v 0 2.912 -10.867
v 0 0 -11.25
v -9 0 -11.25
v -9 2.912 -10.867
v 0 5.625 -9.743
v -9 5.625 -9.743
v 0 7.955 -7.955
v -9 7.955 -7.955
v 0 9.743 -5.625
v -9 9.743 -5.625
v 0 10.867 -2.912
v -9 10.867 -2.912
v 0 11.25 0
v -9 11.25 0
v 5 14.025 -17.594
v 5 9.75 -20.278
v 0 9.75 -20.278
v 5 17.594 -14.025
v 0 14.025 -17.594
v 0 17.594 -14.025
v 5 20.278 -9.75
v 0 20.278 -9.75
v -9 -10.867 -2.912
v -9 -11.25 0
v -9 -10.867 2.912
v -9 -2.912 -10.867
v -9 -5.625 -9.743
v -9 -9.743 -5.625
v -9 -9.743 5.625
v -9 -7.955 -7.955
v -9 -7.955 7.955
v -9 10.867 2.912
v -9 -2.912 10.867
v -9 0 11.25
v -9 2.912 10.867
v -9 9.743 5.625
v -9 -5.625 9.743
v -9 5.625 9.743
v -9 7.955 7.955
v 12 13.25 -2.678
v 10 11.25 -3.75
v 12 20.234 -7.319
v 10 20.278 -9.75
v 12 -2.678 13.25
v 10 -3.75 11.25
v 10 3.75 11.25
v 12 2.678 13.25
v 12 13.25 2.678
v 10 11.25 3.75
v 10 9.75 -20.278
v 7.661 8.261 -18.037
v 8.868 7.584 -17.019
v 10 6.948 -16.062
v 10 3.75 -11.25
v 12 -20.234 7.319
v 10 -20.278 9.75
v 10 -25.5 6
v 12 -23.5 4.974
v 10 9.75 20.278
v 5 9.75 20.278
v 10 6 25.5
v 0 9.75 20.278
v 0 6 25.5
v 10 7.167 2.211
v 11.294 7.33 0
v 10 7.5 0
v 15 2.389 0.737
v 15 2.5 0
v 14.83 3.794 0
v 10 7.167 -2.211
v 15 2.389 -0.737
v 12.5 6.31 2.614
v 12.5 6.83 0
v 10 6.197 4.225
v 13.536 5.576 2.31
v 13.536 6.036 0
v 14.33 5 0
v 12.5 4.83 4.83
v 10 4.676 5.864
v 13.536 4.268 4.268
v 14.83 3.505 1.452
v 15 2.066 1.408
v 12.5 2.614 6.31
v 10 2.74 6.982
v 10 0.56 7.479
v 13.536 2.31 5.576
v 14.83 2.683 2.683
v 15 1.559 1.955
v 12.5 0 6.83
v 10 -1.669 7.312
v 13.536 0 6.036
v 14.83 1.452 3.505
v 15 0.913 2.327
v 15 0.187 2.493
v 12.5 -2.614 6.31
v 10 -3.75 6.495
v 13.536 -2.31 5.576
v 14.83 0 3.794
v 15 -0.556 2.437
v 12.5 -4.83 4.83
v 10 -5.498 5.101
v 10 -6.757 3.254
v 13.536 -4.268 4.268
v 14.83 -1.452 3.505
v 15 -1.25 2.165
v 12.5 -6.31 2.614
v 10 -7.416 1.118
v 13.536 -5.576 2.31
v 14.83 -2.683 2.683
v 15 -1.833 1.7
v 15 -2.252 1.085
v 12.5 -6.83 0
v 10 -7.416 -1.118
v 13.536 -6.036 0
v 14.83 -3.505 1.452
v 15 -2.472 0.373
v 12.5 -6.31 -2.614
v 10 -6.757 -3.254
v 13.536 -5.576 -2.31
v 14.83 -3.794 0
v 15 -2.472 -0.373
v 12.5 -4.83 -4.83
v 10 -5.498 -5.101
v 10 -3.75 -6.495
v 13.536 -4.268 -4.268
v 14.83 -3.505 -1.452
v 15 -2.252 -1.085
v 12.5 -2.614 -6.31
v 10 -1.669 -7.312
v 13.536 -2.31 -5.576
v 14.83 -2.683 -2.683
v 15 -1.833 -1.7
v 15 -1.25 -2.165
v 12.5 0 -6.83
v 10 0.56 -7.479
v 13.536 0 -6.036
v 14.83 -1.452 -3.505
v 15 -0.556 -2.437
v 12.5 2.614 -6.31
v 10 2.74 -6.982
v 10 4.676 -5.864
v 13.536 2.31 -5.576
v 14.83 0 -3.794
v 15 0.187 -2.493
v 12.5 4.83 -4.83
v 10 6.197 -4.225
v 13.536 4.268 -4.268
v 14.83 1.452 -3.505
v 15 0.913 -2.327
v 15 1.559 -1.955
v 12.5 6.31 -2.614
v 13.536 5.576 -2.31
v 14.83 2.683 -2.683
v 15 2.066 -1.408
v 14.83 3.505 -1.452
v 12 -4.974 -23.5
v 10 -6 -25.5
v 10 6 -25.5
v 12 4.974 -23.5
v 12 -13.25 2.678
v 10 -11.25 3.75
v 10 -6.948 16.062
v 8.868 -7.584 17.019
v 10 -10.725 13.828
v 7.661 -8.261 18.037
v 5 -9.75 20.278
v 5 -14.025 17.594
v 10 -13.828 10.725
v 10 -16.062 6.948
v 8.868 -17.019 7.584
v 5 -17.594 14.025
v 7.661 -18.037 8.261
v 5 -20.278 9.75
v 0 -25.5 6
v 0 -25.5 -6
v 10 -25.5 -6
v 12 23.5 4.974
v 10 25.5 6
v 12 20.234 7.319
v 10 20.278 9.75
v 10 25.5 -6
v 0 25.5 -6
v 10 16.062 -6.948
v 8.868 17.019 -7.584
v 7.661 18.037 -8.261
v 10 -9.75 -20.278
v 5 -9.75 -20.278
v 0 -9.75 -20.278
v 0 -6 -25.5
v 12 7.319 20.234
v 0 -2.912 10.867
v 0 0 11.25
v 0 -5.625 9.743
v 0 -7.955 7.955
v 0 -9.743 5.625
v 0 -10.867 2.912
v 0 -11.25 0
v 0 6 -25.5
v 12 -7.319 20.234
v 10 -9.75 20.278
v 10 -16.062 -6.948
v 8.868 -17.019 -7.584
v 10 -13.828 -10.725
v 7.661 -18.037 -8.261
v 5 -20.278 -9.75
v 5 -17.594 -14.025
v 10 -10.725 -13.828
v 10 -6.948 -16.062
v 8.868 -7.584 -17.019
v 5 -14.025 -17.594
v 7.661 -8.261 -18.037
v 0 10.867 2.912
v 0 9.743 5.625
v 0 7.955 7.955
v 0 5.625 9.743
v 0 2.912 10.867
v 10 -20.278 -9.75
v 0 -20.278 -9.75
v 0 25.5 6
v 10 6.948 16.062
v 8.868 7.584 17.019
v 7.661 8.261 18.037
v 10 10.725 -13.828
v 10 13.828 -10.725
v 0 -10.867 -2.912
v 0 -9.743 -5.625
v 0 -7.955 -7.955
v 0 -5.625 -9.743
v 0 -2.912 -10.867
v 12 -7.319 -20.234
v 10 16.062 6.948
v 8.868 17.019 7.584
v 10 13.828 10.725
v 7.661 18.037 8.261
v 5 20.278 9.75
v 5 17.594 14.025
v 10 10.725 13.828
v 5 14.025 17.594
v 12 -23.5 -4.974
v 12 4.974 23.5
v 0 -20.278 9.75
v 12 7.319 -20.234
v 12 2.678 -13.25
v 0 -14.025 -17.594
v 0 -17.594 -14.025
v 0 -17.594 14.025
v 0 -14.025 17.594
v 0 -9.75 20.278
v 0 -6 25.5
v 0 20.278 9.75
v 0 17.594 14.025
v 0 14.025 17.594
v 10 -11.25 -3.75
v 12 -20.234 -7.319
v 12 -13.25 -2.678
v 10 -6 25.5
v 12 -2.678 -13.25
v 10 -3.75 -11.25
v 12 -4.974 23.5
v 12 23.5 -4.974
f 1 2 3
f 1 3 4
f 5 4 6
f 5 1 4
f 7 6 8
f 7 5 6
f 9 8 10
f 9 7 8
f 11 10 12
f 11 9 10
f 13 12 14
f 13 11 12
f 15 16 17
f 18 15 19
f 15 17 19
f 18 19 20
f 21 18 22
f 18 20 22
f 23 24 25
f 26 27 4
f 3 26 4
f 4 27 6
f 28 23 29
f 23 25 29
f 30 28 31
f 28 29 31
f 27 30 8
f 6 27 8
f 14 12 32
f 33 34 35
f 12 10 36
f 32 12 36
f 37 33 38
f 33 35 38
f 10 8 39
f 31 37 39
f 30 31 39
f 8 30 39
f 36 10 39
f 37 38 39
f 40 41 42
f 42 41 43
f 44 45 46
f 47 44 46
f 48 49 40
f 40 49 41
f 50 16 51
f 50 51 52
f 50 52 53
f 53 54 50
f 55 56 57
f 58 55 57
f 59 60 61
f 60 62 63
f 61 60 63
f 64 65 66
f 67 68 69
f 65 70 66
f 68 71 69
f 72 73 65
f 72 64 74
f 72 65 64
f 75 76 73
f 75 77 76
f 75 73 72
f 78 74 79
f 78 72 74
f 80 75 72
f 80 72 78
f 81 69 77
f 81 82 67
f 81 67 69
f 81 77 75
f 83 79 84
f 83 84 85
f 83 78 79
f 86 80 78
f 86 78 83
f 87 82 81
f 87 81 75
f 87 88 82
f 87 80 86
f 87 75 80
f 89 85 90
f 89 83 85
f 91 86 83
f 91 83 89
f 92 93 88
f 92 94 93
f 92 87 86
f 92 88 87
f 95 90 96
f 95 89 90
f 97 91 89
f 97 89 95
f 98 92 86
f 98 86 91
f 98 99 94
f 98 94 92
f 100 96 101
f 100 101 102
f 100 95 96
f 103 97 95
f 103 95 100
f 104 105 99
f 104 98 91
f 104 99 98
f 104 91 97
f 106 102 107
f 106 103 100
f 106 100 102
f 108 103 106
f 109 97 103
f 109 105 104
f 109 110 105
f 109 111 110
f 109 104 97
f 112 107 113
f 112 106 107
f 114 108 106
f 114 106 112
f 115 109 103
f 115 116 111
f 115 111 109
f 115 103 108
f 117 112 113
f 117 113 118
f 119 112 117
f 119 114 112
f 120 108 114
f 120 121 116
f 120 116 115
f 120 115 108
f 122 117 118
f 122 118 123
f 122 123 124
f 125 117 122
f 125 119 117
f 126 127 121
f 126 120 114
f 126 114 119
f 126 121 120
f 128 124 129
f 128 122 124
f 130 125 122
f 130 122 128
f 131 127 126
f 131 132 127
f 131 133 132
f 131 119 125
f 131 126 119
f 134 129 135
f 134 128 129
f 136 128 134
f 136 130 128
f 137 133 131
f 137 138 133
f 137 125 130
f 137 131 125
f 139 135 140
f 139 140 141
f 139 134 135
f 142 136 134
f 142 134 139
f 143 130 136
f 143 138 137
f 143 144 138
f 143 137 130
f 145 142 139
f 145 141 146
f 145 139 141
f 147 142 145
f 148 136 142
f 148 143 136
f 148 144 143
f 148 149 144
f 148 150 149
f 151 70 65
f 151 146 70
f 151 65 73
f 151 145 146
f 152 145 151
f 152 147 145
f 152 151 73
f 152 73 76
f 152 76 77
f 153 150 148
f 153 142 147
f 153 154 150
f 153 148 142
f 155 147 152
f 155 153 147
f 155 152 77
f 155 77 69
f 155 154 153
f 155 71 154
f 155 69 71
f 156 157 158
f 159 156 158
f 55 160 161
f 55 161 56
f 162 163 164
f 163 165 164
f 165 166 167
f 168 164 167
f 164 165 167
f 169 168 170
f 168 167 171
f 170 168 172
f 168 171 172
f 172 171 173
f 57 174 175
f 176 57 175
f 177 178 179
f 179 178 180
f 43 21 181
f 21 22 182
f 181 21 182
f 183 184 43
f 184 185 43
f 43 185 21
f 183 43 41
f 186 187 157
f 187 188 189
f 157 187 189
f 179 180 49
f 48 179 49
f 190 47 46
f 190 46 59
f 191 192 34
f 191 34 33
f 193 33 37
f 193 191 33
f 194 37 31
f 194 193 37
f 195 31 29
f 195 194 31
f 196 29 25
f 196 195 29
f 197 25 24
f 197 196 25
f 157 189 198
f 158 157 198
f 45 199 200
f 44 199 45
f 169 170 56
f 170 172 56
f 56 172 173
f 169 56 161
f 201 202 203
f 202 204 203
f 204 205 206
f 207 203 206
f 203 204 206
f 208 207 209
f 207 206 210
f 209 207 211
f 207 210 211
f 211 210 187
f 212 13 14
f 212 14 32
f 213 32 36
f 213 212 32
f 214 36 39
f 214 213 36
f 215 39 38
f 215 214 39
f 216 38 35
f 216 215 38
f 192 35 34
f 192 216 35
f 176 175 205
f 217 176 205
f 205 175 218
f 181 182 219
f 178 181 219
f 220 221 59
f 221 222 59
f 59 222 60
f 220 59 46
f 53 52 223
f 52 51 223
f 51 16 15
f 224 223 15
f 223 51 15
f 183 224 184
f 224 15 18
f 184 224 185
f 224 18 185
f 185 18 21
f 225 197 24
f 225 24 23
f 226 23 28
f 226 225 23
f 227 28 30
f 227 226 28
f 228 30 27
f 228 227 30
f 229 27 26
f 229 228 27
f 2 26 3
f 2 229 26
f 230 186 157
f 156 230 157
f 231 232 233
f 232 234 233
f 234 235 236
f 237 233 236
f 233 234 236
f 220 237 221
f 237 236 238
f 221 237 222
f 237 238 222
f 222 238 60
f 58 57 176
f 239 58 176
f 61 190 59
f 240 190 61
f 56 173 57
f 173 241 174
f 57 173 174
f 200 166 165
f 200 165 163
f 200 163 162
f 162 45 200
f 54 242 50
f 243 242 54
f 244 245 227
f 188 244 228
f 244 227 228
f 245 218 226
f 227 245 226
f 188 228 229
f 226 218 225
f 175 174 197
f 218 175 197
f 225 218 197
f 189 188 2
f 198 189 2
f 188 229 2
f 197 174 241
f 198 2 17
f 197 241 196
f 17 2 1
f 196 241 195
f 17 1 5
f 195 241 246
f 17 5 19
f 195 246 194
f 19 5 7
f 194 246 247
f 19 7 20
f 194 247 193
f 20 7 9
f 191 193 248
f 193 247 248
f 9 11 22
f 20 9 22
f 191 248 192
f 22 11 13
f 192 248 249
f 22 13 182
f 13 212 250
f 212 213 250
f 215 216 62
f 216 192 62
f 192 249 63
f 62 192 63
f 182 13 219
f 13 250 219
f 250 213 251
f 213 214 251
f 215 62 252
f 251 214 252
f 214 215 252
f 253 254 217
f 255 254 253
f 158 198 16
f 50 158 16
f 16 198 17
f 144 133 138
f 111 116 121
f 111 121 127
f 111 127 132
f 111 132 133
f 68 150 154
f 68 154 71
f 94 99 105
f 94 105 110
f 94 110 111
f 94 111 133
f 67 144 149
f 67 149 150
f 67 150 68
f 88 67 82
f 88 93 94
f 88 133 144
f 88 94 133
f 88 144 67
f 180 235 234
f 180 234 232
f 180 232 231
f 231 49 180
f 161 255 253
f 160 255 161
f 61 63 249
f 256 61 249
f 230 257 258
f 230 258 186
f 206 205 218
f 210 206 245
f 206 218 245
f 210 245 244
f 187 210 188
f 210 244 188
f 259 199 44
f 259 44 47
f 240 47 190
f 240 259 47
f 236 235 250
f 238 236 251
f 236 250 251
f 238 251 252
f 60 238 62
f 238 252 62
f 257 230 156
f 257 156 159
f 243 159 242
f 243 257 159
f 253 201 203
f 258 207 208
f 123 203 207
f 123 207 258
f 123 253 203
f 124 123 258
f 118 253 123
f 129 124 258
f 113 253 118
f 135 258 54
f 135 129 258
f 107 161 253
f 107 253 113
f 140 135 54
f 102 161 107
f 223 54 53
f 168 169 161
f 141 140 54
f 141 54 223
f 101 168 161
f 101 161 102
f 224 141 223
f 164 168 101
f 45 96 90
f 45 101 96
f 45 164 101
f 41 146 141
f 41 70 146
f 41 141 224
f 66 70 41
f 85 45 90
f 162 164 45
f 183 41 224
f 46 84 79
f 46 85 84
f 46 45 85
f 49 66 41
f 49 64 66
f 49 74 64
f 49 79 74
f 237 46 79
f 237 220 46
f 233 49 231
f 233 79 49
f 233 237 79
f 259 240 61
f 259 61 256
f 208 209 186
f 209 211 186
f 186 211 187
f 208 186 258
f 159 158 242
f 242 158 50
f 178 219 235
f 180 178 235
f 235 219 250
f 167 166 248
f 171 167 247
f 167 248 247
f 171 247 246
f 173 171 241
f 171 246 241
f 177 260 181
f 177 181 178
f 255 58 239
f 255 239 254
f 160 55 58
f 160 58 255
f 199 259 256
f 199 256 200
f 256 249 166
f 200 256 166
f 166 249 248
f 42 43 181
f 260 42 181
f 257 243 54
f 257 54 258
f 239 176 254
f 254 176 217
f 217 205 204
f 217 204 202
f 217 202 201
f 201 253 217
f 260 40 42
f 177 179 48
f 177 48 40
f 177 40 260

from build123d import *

# Parameters (mm, degrees)
F1_DEPTH = 10
F2_DEPTH = 12
F3_SIZE  = 5
F4_SIZE  = 1.99999
F5_R     = 7.5
F6_DEPTH = 5
F7_R     = 4.99999
F9_DEPTH = 9


# Not quite as in the source:
# - a fillet or chamfer is up to 0.001 mm smaller than in the source, because OpenCascade refuses the exact size
# - a feature names something its author has since deleted; it is built from what else it names


with BuildPart() as f1:
    # F0 (on Right) → F1 (new body)
    with BuildSketch(Plane.YZ):
        with BuildLine():
            Line((11.25, 3.75), (20.2777587519, 9.75))
            ThreePointArc((20.2777587519, 9.75), (15.9099025767, 15.9099025767), (9.75, 20.2777587519))
            Line((9.75, 20.2777587519), (3.75, 11.25))
            Line((3.75, 11.25), (0, 11.25))
            Line((0, 11.25), (-3.75, 11.25))
            Line((-3.75, 11.25), (-9.75, 20.2777587519))
            ThreePointArc((-9.75, 20.2777587519), (-15.9099025767, 15.9099025767), (-20.2777587519, 9.75))
            Line((-20.2777587519, 9.75), (-11.25, 3.75))
            Line((-11.25, 3.75), (-11.25, 0))
            Line((-11.25, 0), (-11.25, -3.75))
            Line((-11.25, -3.75), (-20.2777587519, -9.75))
            ThreePointArc((-20.2777587519, -9.75), (-15.9099025767, -15.9099025767), (-9.75, -20.2777587519))
            Line((-9.75, -20.2777587519), (-3.75, -11.25))
            Line((-3.75, -11.25), (0, -11.25))
            Line((0, -11.25), (3.75, -11.25))
            Line((3.75, -11.25), (9.75, -20.2777587519))
            ThreePointArc((9.75, -20.2777587519), (15.9099025767, -15.9099025767), (20.2777587519, -9.75))
            Line((20.2777587519, -9.75), (11.25, -3.75))
            Line((11.25, -3.75), (11.25, 0))
            Line((11.25, 0), (11.25, 3.75))
        make_face()
    extrude(amount=F1_DEPTH)

    # F0 (on Right) → F2 (join)
    with BuildSketch(Plane.YZ):
        with BuildLine():
            Line((3.75, 11.25), (9.75, 20.2777587519))
            ThreePointArc((9.75, 20.2777587519), (0, 22.5), (-9.75, 20.2777587519))
            Line((-9.75, 20.2777587519), (-3.75, 11.25))
            Line((-3.75, 11.25), (0, 11.25))
            Line((0, 11.25), (3.75, 11.25))
        make_face()
        with BuildLine():
            ThreePointArc((-9.75, 20.2777587519), (0, 22.5), (9.75, 20.2777587519))
            Line((9.75, 20.2777587519), (6, 25.5))
            Line((6, 25.5), (0, 25.5))
            Line((0, 25.5), (-6, 25.5))
            Line((-6, 25.5), (-9.75, 20.2777587519))
        make_face()
        with BuildLine():
            Line((-11.25, 3.75), (-20.2777587519, 9.75))
            ThreePointArc((-20.2777587519, 9.75), (-22.5, 0), (-20.2777587519, -9.75))
            Line((-20.2777587519, -9.75), (-11.25, -3.75))
            Line((-11.25, -3.75), (-11.25, 0))
            Line((-11.25, 0), (-11.25, 3.75))
        make_face()
        with BuildLine():
            ThreePointArc((-20.2777587519, -9.75), (-22.5, 0), (-20.2777587519, 9.75))
            Line((-20.2777587519, 9.75), (-25.5, 6))
            Line((-25.5, 6), (-25.5, 0))
            Line((-25.5, 0), (-25.5, -6))
            Line((-25.5, -6), (-20.2777587519, -9.75))
        make_face()
        with BuildLine():
            ThreePointArc((-9.75, -20.2777587519), (0, -22.5), (9.75, -20.2777587519))
            Line((9.75, -20.2777587519), (3.75, -11.25))
            Line((3.75, -11.25), (0, -11.25))
            Line((0, -11.25), (-3.75, -11.25))
            Line((-3.75, -11.25), (-9.75, -20.2777587519))
        make_face()
        with BuildLine():
            Line((6, -25.5), (9.75, -20.2777587519))
            ThreePointArc((9.75, -20.2777587519), (0, -22.5), (-9.75, -20.2777587519))
            Line((-9.75, -20.2777587519), (-6, -25.5))
            Line((-6, -25.5), (0, -25.5))
            Line((0, -25.5), (6, -25.5))
        make_face()
        with BuildLine():
            ThreePointArc((20.2777587519, -9.75), (21.93740609, -5.0000214041), (22.5, 0))
            ThreePointArc((22.5, 0), (21.93740609, 5.0000214041), (20.2777587519, 9.75))
            Line((20.2777587519, 9.75), (11.25, 3.75))
            Line((11.25, 3.75), (11.25, 0))
            Line((11.25, 0), (11.25, -3.75))
            Line((11.25, -3.75), (20.2777587519, -9.75))
        make_face()
        with BuildLine():
            ThreePointArc((20.2777587519, 9.75), (21.93740609, 5.0000214041), (22.5, 0))
            ThreePointArc((22.5, 0), (21.93740609, -5.0000214041), (20.2777587519, -9.75))
            Line((20.2777587519, -9.75), (25.5, -6))
            Line((25.5, -6), (25.5, 0))
            Line((25.5, 0), (25.5, 6))
            Line((25.5, 6), (20.2777587519, 9.75))
        make_face()
    extrude(amount=F2_DEPTH)

    # F3
    f3_edges = [f1.edges().sort_by_distance(p)[0] for p in [
        (10, 15.909903, 15.909903),
        (10, -15.909903, 15.909903),
        (10, -15.909903, -15.909903),
        (10, 15.909903, -15.909903),
    ]]
    chamfer(f3_edges, length=F3_SIZE)

    # F4 (size 2 in the source; OpenCascade refuses exactly that, so slightly less here)
    f4_edges = [f1.edges().sort_by_distance(p)[0] for p in [
        (12, 0, 25.5),
        (12, -7.875, 22.888879),
        (12, 7.875, 22.888879),
        (12, -6.75, 15.763879),
        (12, 6.75, 15.763879),
        (12, 0, 11.25),
        (12, -15.763879, 6.75),
        (12, -22.888879, 7.875),
        (12, -25.5, 0),
        (12, -22.888879, -7.875),
        (12, -15.763879, -6.75),
        (12, -11.25, 0),
        (12, 0, -11.25),
        (12, -6.75, -15.763879),
        (12, -7.875, -22.888879),
        (12, 6.75, -15.763879),
        (12, 0, -25.5),
        (12, 7.875, -22.888879),
        (12, 15.763879, -6.75),
        (12, 11.25, 0),
        (12, 15.763879, 6.75),
        (12, 22.888879, 7.875),
        (12, 25.5, 0),
        (12, 22.888879, -7.875),
    ]]
    chamfer(f4_edges, length=F4_SIZE)

    # F5 (on face) → F6 (join)
    with BuildSketch(Plane.YZ.offset(10)):
        Circle(F5_R)
    extrude(amount=F6_DEPTH)

    # F7 (radius 5 in the source; OpenCascade refuses exactly that, so slightly less here)
    f7_edges = [f1.edges().sort_by_distance(p)[0] for p in [
        (15, -7.5, 0),
    ]]
    fillet(f7_edges, radius=F7_R)

    # F8 (on face) → F9 (join)
    with BuildSketch(Plane.YZ):
        with BuildLine():
            ThreePointArc((0, -11.25), (7.9549512883, -7.9549512883), (11.25, 0))
            ThreePointArc((11.25, 0), (7.9549512883, 7.9549512883), (0, 11.25))
            ThreePointArc((0, 11.25), (-7.9549512883, 7.9549512883), (-11.25, 0))
            ThreePointArc((-11.25, 0), (-7.9549512883, -7.9549512883), (0, -11.25))
        make_face()
    extrude(amount=-F9_DEPTH)


solid = f1.part
